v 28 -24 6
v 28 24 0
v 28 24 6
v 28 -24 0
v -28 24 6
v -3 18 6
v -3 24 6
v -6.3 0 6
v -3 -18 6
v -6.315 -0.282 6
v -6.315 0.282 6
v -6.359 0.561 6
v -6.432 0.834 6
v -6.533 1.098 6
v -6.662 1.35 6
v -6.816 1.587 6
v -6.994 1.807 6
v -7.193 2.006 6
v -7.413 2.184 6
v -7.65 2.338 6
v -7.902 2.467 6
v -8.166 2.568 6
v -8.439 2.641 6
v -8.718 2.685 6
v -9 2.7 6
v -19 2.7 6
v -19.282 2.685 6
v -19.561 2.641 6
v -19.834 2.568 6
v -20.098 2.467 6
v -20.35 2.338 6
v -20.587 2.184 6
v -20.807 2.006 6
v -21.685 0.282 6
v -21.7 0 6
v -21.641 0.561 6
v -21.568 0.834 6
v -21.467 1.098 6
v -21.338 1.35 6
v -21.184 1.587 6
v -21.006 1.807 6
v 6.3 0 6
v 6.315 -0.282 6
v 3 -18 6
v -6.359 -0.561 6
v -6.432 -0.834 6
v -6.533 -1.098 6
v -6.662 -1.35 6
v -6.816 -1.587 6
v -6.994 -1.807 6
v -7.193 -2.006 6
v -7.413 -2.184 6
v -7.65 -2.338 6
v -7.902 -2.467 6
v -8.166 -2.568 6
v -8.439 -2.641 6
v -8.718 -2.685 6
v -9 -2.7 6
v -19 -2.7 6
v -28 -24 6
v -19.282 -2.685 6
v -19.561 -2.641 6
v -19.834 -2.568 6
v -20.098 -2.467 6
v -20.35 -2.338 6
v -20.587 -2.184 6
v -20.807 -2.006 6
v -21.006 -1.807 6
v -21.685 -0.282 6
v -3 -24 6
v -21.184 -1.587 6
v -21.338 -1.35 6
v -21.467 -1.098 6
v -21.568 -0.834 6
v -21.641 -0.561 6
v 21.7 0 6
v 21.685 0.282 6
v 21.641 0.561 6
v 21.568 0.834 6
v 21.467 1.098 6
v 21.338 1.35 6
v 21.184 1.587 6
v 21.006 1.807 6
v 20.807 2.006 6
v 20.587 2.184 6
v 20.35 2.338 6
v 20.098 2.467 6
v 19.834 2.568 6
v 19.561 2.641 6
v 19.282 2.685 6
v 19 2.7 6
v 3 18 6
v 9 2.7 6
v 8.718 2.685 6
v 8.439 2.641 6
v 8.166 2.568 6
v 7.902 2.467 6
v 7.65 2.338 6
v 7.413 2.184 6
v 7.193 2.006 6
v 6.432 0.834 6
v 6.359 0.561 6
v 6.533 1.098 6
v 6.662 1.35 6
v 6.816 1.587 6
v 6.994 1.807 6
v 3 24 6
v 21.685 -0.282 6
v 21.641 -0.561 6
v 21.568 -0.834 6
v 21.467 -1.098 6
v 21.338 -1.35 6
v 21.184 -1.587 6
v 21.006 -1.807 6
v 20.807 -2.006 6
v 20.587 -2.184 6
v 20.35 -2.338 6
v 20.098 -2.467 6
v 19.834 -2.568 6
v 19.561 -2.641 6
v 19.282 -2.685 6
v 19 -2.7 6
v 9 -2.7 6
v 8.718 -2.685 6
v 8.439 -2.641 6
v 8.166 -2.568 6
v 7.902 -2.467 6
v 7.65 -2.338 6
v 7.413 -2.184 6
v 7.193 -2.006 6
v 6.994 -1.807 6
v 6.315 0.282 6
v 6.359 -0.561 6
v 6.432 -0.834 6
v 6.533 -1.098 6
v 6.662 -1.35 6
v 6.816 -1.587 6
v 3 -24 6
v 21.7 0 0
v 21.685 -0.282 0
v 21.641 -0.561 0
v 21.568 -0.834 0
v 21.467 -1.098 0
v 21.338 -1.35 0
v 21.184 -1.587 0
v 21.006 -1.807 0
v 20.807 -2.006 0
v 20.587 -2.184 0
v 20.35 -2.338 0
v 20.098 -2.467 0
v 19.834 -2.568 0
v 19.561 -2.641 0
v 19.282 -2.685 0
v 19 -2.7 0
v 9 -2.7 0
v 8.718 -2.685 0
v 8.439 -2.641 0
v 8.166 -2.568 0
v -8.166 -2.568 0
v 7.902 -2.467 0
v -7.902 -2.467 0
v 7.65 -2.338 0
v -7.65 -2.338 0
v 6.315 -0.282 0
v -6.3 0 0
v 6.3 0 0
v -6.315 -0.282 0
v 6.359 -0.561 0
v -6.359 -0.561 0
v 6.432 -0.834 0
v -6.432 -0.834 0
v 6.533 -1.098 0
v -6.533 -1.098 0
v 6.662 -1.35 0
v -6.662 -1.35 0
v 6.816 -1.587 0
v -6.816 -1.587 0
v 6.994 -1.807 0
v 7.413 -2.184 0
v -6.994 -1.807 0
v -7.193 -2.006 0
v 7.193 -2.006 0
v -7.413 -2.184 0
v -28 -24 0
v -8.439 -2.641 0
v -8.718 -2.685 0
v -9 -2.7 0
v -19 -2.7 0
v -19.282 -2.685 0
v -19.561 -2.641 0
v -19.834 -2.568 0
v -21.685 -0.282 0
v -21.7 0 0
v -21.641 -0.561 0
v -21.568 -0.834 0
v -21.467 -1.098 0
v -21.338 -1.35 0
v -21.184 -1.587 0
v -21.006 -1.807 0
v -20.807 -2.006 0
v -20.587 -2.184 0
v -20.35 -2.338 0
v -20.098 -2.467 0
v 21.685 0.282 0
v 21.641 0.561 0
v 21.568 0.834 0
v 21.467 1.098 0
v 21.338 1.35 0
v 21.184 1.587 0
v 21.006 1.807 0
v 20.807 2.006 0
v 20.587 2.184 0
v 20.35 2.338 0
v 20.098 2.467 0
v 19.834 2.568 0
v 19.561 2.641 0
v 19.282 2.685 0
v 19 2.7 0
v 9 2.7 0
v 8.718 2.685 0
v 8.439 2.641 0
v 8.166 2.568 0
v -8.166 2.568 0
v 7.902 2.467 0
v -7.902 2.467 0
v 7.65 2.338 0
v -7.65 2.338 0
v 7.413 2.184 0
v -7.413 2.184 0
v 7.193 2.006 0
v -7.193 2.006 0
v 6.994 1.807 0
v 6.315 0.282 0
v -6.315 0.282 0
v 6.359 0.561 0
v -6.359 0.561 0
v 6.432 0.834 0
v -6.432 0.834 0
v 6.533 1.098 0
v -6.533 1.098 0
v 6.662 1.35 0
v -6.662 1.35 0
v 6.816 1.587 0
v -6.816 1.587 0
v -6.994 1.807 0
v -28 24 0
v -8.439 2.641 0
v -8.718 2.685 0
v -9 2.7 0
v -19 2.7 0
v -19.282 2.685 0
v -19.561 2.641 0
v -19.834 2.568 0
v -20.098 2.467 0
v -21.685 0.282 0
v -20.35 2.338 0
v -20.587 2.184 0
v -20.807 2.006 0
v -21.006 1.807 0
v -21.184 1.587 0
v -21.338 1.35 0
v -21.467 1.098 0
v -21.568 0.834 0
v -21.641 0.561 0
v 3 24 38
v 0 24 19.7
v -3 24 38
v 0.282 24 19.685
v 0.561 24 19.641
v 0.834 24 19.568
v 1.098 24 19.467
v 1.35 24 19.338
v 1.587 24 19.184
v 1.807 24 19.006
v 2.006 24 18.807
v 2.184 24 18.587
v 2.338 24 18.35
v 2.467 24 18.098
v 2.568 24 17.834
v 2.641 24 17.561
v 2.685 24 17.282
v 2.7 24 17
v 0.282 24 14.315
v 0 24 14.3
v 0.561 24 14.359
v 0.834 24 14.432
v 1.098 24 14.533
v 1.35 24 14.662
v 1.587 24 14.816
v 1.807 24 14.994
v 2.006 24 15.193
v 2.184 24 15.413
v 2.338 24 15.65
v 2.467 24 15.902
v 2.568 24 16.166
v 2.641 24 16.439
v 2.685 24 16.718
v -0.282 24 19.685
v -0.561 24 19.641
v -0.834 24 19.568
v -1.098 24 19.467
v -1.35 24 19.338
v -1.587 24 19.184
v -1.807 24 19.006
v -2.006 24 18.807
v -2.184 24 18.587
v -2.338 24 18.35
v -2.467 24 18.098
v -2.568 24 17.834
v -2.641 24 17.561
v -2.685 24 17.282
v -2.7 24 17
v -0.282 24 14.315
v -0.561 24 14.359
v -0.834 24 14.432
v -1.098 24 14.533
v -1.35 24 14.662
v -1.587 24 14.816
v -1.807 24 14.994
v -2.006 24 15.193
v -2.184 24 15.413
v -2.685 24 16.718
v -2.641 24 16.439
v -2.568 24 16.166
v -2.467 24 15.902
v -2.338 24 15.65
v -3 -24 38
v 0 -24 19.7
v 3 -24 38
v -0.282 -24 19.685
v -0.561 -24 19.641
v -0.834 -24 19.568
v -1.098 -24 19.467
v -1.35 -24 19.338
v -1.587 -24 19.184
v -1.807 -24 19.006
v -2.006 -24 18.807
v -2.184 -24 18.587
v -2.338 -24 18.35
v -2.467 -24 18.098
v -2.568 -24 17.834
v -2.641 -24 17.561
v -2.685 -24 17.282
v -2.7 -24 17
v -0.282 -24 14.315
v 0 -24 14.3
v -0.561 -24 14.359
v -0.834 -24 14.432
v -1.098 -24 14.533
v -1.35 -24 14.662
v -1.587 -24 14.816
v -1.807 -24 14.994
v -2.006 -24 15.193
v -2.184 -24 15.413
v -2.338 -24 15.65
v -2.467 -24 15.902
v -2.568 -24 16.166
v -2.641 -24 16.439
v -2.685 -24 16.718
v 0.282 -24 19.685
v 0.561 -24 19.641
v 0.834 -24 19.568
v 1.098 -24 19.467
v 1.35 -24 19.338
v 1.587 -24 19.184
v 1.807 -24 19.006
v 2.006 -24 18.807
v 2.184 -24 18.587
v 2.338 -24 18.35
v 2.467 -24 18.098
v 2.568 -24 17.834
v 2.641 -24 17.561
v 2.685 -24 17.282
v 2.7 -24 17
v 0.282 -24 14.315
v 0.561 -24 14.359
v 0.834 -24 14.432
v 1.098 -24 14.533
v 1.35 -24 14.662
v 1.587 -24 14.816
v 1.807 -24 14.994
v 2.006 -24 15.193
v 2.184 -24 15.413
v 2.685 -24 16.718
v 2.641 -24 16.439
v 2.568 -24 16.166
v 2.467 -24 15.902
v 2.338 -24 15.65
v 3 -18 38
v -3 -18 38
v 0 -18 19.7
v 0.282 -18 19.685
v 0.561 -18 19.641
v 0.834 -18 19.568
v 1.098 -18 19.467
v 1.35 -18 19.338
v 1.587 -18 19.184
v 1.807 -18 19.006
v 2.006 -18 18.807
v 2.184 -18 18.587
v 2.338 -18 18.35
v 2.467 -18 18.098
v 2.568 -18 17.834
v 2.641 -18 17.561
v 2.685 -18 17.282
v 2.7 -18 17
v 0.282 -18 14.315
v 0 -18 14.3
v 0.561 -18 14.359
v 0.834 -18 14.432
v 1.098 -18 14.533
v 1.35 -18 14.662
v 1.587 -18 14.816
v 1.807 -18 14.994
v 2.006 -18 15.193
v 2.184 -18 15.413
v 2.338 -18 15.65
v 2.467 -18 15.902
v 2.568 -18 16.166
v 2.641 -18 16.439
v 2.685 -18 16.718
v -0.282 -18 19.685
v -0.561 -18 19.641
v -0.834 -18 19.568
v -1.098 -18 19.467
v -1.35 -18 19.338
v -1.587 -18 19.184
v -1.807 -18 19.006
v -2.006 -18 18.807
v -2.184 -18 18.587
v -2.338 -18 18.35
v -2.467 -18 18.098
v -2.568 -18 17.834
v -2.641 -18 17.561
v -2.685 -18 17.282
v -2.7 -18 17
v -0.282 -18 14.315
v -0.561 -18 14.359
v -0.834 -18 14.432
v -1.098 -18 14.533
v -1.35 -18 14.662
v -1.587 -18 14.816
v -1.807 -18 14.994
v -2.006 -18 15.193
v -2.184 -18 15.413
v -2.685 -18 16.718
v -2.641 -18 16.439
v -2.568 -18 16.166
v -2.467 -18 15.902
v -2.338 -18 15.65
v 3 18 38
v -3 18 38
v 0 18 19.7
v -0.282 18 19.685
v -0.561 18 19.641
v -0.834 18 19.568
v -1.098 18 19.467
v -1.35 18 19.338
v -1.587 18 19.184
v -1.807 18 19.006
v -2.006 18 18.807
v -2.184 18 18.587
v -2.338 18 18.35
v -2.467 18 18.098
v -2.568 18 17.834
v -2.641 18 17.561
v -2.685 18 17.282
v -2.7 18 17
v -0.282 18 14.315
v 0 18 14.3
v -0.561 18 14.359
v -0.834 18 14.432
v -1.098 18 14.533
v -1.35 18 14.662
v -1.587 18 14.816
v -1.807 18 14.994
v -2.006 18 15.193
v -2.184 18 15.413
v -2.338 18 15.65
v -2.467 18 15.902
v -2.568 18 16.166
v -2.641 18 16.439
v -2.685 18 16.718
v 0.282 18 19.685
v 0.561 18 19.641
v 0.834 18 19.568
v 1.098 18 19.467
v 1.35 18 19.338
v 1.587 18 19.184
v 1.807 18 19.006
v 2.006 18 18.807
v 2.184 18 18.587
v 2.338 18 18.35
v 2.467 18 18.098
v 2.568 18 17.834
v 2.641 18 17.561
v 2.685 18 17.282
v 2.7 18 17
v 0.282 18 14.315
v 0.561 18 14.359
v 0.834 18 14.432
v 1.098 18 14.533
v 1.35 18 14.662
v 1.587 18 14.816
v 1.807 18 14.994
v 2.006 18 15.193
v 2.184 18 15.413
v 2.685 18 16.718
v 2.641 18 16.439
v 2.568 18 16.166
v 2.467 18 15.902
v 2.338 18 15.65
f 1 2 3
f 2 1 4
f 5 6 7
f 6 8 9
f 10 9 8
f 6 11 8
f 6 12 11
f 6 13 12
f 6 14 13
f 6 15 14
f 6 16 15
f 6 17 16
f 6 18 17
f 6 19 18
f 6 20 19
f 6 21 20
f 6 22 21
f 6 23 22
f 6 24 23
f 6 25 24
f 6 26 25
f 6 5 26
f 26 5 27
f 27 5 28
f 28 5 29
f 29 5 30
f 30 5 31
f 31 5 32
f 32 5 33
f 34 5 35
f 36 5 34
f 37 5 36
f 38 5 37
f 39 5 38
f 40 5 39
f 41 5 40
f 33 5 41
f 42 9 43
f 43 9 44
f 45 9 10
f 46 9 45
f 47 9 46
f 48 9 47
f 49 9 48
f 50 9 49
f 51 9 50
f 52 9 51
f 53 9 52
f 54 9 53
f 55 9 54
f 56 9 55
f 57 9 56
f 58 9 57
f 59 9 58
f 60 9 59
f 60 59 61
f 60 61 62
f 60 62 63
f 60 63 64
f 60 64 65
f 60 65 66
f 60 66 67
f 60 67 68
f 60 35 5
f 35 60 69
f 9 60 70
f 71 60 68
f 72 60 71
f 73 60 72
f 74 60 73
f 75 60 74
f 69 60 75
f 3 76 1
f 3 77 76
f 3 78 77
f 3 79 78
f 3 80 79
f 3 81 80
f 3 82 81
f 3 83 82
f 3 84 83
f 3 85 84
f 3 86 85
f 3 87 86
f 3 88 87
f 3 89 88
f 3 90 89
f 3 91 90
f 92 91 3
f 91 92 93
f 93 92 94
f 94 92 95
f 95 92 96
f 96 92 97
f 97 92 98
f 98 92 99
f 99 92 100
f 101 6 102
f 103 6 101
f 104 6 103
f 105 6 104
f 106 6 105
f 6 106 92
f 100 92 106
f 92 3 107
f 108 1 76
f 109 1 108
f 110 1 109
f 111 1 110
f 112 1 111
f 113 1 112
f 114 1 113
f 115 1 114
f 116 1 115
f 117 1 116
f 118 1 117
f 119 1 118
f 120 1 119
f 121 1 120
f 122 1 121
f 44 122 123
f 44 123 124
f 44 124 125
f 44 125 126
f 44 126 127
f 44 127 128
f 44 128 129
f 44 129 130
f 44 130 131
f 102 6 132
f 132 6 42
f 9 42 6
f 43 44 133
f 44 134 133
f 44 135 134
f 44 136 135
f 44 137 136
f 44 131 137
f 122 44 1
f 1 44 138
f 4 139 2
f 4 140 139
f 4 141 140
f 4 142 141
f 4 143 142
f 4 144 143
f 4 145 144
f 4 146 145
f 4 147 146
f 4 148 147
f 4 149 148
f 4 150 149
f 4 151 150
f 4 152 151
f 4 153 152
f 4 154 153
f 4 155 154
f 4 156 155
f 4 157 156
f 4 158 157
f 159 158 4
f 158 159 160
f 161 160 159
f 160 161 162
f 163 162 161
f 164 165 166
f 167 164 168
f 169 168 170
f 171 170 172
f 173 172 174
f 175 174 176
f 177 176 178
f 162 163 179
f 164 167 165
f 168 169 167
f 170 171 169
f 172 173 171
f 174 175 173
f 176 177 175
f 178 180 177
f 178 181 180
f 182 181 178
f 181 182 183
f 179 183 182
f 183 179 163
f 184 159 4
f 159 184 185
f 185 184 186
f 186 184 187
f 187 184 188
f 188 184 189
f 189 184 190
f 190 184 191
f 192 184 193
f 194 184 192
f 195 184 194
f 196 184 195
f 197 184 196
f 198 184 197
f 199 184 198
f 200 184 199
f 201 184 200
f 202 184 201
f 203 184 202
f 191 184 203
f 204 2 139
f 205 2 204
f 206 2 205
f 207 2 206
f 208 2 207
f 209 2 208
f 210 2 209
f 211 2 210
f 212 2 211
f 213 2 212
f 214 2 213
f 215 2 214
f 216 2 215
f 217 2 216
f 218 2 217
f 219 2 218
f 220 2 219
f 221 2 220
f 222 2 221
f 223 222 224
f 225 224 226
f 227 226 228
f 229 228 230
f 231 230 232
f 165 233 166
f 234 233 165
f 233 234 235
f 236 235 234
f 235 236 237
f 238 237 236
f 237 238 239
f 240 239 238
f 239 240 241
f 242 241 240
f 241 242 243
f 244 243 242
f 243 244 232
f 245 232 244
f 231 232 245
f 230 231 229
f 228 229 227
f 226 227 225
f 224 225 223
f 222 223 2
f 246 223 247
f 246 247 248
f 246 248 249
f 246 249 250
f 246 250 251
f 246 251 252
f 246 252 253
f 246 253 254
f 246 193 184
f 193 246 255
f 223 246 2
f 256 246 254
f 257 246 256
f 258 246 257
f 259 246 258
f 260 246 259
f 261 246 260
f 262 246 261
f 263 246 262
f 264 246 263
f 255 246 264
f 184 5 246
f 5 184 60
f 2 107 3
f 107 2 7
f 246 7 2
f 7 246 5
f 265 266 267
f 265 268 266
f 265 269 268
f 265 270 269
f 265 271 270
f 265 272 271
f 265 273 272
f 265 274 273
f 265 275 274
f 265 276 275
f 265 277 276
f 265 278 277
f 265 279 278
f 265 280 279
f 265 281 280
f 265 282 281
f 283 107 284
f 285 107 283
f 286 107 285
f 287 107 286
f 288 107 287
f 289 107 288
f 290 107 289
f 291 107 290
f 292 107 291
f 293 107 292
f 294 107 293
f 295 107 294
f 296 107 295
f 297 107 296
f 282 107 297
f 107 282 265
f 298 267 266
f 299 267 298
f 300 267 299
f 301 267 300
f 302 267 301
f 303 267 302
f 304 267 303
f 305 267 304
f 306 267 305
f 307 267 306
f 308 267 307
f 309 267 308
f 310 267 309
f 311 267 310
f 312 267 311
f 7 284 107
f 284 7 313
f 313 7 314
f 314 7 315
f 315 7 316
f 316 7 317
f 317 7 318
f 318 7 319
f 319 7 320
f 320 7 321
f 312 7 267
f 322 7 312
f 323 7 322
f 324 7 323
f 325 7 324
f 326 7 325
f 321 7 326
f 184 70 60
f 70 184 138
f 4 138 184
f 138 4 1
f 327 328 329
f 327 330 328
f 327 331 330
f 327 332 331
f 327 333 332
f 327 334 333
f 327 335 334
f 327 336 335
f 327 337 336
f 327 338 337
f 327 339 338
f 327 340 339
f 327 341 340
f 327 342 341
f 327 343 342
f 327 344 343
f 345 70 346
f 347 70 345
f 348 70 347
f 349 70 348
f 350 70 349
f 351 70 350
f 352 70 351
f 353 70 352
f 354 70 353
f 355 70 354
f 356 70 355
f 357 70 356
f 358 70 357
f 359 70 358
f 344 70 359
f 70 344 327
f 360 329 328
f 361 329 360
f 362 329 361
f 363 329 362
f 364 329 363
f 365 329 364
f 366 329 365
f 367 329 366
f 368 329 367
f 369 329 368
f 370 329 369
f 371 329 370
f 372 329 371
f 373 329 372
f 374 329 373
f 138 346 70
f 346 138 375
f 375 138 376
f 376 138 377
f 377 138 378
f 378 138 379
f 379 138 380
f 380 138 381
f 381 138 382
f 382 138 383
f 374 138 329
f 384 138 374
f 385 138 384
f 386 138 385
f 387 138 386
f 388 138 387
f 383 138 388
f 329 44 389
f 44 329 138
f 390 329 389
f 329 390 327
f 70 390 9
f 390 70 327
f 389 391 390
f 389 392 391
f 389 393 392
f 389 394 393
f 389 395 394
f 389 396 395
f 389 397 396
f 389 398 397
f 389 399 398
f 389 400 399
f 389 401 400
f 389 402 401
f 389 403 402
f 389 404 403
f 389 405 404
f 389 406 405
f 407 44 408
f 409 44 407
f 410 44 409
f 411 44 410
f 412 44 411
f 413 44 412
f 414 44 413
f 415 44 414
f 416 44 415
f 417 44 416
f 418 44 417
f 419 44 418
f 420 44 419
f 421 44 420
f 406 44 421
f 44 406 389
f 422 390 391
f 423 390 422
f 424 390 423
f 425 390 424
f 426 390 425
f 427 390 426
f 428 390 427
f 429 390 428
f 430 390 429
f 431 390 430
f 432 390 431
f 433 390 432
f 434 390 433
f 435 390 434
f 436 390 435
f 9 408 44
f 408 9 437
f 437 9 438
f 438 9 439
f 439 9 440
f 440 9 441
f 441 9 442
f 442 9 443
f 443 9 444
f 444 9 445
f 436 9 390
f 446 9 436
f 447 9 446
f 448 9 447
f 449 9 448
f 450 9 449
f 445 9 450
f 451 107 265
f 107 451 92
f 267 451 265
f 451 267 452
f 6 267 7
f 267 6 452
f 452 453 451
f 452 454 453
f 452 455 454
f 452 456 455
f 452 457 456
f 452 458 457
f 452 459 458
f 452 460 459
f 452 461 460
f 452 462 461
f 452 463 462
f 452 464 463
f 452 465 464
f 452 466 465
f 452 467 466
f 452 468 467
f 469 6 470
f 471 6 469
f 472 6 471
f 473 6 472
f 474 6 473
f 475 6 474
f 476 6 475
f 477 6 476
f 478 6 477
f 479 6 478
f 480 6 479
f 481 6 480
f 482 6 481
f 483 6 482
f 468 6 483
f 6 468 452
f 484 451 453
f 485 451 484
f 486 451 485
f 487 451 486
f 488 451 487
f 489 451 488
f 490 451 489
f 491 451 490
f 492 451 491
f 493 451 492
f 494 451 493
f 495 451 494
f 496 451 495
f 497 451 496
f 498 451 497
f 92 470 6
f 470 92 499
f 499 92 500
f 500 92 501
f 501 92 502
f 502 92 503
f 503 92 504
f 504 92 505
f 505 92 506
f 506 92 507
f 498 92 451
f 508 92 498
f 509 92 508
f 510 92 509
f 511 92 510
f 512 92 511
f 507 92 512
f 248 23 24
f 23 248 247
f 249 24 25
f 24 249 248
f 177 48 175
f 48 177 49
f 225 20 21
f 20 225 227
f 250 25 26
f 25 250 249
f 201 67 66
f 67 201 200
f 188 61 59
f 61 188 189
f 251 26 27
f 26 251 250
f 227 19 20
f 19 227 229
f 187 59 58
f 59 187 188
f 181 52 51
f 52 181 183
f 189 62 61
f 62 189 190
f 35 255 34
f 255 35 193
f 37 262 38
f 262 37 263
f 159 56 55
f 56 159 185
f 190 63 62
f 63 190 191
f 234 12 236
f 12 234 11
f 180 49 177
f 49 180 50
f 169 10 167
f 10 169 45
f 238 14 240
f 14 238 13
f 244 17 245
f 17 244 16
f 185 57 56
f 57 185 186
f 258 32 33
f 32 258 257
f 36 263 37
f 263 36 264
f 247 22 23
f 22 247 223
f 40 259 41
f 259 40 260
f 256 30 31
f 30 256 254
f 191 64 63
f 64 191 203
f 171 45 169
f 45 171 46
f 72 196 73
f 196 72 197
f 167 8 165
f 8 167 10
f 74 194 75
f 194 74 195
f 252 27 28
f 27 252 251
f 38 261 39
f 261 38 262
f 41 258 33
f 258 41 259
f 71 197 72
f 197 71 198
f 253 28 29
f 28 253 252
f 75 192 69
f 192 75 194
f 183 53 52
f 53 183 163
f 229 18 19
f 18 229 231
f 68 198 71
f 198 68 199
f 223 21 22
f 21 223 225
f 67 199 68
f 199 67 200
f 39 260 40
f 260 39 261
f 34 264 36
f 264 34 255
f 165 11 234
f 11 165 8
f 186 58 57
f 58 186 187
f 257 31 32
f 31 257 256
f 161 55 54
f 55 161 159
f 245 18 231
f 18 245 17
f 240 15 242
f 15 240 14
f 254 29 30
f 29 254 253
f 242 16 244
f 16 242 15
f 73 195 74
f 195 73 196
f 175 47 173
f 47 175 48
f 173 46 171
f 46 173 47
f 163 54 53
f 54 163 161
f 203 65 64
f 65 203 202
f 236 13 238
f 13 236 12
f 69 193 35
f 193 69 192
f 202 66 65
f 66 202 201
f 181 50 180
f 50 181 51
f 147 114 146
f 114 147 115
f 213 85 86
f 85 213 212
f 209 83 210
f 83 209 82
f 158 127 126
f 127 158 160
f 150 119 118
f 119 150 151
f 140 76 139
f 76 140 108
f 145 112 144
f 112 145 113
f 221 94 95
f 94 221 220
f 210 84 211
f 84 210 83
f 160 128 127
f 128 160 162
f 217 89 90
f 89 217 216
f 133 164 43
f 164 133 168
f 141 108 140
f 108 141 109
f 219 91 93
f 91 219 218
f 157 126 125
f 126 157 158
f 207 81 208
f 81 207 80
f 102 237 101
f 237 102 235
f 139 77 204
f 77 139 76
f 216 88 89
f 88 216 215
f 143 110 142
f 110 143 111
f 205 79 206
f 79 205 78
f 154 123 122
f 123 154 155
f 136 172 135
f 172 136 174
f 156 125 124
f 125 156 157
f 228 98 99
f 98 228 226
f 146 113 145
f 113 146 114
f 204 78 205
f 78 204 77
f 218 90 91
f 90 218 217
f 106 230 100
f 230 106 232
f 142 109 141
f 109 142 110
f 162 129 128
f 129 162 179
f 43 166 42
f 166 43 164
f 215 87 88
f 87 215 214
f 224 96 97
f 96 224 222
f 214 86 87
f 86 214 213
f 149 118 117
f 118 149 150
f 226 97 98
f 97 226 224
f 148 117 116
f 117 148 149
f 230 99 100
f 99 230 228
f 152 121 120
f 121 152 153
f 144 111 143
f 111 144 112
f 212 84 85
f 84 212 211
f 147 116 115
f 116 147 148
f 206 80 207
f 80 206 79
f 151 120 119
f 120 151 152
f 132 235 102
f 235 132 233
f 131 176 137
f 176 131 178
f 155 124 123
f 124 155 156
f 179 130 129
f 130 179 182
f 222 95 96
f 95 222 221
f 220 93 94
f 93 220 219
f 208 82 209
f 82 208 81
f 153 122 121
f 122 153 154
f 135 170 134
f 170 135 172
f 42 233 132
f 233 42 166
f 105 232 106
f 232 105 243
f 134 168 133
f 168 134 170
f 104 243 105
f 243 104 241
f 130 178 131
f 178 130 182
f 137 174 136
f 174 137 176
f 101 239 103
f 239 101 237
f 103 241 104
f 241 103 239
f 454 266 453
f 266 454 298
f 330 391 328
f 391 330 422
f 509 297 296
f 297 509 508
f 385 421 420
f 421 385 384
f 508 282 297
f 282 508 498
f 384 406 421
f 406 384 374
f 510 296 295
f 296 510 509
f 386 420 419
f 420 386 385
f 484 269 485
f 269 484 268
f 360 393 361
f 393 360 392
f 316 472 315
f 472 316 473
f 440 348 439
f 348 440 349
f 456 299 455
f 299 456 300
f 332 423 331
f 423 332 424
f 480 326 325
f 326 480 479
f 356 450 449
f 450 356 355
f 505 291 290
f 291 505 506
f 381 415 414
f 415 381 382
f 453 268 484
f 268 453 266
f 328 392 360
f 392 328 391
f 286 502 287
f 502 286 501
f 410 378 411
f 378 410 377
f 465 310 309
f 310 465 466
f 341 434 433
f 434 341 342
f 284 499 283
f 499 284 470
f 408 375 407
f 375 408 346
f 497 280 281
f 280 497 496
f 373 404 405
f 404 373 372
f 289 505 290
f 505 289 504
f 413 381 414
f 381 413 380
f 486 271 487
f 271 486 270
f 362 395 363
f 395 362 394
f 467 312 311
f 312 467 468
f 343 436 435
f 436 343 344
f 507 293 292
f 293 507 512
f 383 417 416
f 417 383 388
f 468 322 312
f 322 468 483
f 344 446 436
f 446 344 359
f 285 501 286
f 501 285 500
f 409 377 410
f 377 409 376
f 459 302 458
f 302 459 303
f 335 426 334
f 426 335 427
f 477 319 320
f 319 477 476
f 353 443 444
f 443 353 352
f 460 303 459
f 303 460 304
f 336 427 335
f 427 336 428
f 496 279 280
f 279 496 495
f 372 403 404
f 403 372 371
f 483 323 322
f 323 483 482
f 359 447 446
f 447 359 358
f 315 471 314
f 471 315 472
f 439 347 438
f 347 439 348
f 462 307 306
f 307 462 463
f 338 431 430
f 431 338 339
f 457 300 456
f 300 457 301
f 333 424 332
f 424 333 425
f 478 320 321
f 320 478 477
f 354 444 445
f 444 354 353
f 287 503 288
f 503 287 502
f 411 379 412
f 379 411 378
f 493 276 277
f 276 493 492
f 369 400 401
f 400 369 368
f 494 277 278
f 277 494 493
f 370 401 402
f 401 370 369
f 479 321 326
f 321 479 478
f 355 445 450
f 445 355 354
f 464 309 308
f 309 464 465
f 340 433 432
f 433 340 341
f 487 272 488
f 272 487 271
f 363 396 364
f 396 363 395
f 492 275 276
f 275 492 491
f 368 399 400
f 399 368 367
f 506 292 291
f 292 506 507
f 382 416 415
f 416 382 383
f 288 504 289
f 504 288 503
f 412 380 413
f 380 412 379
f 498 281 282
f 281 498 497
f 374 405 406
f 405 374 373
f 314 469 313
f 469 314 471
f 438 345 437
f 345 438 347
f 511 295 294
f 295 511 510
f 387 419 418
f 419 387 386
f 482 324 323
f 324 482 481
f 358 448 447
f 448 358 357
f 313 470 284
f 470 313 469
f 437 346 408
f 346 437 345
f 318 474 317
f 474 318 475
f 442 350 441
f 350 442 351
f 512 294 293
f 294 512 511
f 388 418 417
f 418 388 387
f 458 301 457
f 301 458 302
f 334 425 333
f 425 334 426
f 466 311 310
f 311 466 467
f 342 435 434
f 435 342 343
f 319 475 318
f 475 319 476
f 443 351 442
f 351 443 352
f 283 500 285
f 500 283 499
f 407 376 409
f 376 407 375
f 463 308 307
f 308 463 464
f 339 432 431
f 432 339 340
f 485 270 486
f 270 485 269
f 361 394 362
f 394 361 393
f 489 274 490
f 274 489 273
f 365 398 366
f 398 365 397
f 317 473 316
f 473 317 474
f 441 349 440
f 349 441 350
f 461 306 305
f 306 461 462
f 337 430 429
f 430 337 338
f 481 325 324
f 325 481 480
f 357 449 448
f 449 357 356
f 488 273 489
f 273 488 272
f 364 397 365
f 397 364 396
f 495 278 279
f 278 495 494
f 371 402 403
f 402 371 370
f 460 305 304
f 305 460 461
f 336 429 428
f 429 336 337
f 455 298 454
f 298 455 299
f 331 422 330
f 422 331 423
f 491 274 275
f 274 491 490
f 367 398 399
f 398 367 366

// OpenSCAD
// U pivot bracket, 36 mm opening.
$fn = 60;
eps = 0.02;
base_l = 56;
base_w = 48;
base_t = 6;
ear_t = 6;
ear_h = 34;
pivot_d = 5.4;
module mount(x) {
    hull() {
        translate([x - 5, 0, -eps]) cylinder(d = 5.4, h = base_t + 2 * eps);
        translate([x + 5, 0, -eps]) cylinder(d = 5.4, h = base_t + 2 * eps);
    }
}
difference() {
    union() {
        translate([-base_l / 2, -base_w / 2, 0]) cube([base_l, base_w, base_t]);
        translate([-ear_t / 2, -base_w / 2, base_t - 2]) cube([ear_t, ear_t, ear_h]);
        translate([-ear_t / 2, base_w / 2 - ear_t, base_t - 2]) cube([ear_t, ear_t, ear_h]);
    }
    mount(-14); mount(14);
    translate([0, -base_w / 2 - eps, ear_h / 2]) rotate([-90, 0, 0]) cylinder(d = pivot_d, h = base_w + 2 * eps);
}
